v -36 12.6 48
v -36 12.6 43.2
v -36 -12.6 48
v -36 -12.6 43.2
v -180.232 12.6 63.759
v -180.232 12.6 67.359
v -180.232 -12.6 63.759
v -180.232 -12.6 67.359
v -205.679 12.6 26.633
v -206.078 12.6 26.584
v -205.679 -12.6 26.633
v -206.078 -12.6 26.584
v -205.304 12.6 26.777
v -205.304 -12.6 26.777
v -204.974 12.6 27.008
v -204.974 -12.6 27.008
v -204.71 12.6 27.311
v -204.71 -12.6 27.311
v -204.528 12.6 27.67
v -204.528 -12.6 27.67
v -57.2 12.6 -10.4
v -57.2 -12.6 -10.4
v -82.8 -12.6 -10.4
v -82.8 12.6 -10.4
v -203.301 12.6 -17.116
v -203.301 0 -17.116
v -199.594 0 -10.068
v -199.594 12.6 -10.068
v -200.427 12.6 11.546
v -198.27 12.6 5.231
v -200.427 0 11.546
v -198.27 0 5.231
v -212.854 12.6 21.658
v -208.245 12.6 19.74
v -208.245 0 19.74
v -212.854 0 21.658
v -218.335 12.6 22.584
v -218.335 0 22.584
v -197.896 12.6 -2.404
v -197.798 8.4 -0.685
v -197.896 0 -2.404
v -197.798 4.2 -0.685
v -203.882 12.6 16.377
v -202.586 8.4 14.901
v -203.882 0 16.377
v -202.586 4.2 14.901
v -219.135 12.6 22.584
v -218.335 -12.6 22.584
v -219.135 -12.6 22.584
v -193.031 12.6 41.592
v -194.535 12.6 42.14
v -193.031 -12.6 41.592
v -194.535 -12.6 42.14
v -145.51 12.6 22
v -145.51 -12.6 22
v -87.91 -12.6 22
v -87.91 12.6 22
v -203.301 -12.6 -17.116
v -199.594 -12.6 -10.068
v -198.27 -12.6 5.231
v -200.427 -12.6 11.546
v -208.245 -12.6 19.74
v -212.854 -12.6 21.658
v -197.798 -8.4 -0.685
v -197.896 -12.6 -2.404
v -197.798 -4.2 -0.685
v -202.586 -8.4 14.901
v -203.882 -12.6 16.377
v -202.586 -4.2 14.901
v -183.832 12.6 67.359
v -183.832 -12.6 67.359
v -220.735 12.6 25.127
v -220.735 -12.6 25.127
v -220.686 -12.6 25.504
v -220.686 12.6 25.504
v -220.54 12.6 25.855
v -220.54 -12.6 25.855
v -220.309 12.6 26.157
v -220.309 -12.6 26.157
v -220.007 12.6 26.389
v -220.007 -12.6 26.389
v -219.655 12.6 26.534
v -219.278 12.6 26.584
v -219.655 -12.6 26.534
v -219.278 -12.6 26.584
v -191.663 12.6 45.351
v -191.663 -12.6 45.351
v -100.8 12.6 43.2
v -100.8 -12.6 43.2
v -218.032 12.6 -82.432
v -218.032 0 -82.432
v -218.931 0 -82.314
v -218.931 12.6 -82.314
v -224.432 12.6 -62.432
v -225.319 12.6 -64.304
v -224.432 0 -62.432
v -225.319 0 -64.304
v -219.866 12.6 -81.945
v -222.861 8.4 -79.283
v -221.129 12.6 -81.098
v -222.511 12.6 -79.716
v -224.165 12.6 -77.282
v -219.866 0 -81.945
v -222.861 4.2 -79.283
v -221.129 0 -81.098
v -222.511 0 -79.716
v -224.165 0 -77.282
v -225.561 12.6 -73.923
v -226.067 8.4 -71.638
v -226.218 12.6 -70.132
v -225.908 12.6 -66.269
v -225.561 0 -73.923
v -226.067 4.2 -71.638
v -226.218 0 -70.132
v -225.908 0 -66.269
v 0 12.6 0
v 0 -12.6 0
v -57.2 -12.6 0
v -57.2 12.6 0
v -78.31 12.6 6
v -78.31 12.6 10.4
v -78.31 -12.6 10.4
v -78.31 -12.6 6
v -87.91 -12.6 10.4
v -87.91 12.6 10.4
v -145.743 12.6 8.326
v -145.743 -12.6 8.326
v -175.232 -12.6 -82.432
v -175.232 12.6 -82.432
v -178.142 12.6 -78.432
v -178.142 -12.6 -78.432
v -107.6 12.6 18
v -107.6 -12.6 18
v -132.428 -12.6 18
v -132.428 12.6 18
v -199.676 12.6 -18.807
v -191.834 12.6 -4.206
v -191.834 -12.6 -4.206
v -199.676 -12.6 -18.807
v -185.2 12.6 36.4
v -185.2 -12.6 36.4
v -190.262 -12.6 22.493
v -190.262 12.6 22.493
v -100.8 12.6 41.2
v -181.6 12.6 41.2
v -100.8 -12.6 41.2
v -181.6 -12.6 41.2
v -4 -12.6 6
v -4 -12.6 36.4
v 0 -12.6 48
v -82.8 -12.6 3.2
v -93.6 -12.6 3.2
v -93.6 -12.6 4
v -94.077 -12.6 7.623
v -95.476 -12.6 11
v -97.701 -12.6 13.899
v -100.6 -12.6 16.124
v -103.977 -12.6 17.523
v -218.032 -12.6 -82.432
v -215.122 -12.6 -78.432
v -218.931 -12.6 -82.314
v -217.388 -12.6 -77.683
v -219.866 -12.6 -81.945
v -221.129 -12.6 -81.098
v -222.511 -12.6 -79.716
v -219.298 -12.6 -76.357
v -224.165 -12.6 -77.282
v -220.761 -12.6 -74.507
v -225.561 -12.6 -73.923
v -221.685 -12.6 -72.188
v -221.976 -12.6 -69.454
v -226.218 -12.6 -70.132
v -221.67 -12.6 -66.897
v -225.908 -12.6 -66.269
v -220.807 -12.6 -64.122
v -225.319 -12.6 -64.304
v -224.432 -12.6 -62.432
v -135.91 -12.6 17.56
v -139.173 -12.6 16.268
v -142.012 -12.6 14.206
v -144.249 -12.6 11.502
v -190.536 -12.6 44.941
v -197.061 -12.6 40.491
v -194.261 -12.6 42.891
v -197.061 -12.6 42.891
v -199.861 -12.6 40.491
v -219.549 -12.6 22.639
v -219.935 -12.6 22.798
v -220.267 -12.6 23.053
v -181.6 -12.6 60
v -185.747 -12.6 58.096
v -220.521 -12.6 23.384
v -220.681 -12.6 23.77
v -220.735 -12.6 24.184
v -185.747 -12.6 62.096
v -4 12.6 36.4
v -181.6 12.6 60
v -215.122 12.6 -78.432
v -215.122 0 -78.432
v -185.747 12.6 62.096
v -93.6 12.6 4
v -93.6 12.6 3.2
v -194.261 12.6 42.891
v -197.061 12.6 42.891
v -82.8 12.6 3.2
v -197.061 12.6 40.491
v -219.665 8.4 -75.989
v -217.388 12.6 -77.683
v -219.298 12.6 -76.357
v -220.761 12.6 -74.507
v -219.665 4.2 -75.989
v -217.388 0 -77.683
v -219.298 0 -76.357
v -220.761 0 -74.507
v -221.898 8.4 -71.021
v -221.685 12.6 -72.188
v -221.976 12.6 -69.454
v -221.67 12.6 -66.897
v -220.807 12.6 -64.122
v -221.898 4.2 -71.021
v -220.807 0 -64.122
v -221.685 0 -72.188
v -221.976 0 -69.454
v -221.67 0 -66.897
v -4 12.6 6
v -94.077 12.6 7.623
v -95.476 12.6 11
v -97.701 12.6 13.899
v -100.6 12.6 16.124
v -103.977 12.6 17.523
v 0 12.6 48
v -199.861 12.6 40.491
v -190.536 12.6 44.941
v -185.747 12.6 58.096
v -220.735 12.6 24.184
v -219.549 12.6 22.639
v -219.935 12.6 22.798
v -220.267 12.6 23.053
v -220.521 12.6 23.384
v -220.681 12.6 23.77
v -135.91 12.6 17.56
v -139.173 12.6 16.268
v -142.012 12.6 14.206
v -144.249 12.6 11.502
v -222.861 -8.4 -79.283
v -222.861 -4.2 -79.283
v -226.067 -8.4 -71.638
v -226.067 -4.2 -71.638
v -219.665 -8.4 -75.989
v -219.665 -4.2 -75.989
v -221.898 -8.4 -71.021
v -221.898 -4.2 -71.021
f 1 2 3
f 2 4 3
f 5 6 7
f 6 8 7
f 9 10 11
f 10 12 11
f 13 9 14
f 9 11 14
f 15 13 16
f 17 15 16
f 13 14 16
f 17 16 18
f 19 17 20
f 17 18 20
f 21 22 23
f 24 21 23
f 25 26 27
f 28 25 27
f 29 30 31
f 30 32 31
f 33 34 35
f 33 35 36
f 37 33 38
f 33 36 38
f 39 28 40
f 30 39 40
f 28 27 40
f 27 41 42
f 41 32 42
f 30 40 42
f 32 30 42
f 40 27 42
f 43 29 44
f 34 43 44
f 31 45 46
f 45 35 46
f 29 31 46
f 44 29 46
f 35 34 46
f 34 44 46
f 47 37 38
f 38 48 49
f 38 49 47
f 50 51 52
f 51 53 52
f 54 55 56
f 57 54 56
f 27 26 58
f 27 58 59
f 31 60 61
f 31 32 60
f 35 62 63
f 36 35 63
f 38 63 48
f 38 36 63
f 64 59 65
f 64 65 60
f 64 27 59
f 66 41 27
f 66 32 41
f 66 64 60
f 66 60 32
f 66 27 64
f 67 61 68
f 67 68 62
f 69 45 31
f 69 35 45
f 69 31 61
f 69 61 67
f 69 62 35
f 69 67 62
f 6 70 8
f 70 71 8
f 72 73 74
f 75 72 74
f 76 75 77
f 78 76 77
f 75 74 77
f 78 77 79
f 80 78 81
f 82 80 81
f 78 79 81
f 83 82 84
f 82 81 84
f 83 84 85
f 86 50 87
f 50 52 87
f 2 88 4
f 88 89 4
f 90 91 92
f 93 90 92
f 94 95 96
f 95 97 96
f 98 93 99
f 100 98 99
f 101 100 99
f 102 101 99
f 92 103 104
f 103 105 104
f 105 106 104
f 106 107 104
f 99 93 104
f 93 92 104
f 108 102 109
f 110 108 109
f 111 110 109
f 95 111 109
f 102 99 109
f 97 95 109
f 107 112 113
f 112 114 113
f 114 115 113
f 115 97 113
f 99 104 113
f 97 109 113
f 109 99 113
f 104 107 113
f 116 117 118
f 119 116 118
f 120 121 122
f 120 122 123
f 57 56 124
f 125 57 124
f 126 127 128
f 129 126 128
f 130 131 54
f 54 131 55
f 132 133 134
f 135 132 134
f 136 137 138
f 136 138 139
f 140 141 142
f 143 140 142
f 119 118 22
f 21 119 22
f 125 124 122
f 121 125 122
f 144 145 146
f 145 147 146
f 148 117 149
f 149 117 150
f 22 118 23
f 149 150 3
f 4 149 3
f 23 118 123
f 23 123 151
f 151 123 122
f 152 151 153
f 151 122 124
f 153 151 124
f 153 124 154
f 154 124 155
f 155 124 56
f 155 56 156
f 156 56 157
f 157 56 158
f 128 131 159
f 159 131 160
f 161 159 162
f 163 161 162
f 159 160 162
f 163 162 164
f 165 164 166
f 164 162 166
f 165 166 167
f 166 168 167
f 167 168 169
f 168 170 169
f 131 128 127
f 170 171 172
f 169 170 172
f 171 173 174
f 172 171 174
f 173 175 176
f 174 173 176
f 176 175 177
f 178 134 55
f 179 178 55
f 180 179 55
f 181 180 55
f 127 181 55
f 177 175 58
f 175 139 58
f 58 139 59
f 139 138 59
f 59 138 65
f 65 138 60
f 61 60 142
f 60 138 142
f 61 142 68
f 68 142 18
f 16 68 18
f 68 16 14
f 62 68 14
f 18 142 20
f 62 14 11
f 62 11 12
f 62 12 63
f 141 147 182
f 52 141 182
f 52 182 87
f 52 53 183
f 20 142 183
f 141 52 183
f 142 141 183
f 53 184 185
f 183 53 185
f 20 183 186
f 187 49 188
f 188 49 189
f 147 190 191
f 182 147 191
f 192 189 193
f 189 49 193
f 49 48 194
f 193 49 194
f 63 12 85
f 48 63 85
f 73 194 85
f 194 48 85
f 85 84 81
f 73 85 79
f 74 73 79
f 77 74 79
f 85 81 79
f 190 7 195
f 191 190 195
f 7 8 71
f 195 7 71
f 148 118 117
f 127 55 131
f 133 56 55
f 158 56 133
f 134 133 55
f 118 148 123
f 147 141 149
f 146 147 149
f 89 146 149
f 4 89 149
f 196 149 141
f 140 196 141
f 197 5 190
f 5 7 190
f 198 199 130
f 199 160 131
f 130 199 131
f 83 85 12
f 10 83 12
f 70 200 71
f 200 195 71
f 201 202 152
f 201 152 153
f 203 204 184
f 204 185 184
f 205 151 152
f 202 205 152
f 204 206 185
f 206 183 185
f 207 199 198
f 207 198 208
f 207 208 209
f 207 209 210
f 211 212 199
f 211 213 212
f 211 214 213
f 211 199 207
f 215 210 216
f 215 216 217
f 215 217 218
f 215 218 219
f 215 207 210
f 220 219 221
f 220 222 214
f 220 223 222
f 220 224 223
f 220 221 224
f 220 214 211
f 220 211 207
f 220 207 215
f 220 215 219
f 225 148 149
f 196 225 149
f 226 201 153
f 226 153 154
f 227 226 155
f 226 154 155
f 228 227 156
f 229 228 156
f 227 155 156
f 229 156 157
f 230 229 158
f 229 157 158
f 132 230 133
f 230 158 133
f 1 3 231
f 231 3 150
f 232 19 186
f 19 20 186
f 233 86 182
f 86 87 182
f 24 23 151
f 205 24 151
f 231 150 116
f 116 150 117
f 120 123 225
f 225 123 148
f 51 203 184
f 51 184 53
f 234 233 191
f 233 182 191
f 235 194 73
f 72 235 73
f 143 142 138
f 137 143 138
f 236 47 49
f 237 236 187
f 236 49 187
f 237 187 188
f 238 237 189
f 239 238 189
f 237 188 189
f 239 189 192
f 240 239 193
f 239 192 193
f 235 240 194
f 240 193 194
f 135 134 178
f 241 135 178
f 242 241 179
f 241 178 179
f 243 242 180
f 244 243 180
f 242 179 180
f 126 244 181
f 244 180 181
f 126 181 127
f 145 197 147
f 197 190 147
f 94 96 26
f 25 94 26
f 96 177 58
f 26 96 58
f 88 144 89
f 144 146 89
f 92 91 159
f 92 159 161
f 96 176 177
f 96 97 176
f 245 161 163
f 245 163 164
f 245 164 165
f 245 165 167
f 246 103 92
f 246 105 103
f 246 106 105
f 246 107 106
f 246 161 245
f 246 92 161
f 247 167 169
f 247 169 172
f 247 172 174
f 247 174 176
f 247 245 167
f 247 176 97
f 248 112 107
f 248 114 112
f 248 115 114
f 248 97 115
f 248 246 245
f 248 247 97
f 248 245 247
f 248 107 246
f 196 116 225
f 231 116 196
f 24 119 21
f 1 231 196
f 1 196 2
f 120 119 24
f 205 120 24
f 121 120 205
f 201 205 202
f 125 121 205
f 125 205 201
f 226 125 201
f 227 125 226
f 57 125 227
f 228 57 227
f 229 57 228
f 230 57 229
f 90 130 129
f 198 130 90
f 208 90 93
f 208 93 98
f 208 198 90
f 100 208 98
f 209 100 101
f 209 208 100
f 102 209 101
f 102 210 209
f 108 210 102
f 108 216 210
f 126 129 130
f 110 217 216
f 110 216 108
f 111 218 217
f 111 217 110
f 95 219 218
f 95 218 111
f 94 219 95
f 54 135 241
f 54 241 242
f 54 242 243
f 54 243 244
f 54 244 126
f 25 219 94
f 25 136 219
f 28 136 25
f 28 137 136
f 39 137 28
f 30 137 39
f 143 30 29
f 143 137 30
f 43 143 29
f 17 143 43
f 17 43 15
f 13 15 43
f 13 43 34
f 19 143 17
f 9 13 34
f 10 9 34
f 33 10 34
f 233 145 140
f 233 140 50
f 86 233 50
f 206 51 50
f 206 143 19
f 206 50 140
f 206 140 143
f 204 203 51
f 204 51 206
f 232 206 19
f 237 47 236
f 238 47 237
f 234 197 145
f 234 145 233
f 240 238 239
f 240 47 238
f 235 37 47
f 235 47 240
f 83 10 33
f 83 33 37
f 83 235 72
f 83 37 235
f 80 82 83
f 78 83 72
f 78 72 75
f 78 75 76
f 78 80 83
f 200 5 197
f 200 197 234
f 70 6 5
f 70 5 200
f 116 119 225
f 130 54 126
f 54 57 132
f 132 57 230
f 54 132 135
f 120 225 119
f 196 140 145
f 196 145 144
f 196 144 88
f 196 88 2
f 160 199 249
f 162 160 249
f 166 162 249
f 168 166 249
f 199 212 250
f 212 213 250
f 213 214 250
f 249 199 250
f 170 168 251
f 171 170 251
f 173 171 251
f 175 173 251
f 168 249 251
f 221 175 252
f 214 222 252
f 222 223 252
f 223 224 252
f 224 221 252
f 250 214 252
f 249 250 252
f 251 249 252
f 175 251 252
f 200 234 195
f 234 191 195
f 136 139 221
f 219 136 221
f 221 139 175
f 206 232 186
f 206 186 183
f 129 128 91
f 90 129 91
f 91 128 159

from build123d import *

# Parameters (mm, degrees)
EXTRUDE_DEPTH = 12.6


with BuildPart() as part:
    # Sketch → Extrude (new body, symmetric)
    with BuildSketch(Plane.XZ):
        with BuildLine():
            Line((-219.278359, 26.583984), (-206.078359, 26.583984))
            ThreePointArc((-206.078359, 26.583984), (-205.131957, 26.882383), (-204.527866, 27.669651))
            Line((-204.527866, 27.669651), (-199.861118, 40.491435))
            Line((-199.861118, 40.491435), (-197.061118, 40.491435))
            Line((-197.061118, 40.491435), (-197.061118, 42.891435))
            Line((-197.061118, 42.891435), (-194.261118, 42.891435))
            Line((-194.261118, 42.891435), (-194.534734, 42.139681))
            Line((-194.534734, 42.139681), (-193.031226, 41.592449))
            Line((-193.031226, 41.592449), (-191.663145, 45.351219))
            Line((-191.663145, 45.351219), (-190.535514, 44.940795))
            Line((-190.535514, 44.940795), (-185.747232, 58.096492))
            Line((-185.747232, 58.096492), (-185.747232, 62.096492))
            Line((-185.747232, 62.096492), (-183.831919, 67.35877))
            Line((-183.831919, 67.35877), (-180.231919, 67.35877))
            Line((-180.231919, 67.35877), (-180.231919, 63.75877))
            Line((-180.231919, 63.75877), (-181.6, 60))
            Line((-181.6, 60), (-181.6, 41.2))
            Line((-181.6, 41.2), (-100.8, 41.2))
            Line((-100.8, 41.2), (-100.8, 43.2))
            Line((-100.8, 43.2), (-36, 43.2))
            Line((-36, 43.2), (-36, 48))
            Line((-36, 48), (0, 48))
            Line((0, 48), (0, 0))
            Line((0, 0), (-57.2, 0))
            Line((-57.2, 0), (-57.2, -10.4))
            Line((-57.2, -10.4), (-82.8, -10.4))
            Line((-82.8, -10.4), (-82.8, 3.2))
            Line((-82.8, 3.2), (-93.6, 3.2))
            Line((-93.6, 3.2), (-93.6, 4))
            ThreePointArc((-93.6, 4), (-97.700505, 13.899495), (-107.6, 18))
            Line((-107.6, 18), (-132.428405, 18))
            ThreePointArc((-132.428405, 18), (-140.657398, 15.326238), (-145.743196, 8.326238))
            Line((-145.743196, 8.326238), (-175.232195, -82.431568))
            Line((-175.232195, -82.431568), (-218.032195, -82.431568))
            add(Edge.make_bspline(
                [(-218.032195, -82.431568), (-222.60054, -82.508301), (-229.560425, -71.441643), (-224.432195, -62.431568)],
                knots=[0, 0, 0, 0, 16.552678, 16.552678, 16.552678, 16.552678], degree=3))
            Line((-224.432195, -62.431568), (-203.301282, -17.116179))
            add(Edge.make_bspline(
                [(-203.301282, -17.116179), (-192.874893, -2.614162), (-196.88326, 21.204461), (-218.335348, 22.583984)],
                knots=[0, 0, 0, 0, 54.516173, 54.516173, 54.516173, 54.516173], degree=3))
            Line((-218.335348, 22.583984), (-219.135348, 22.583984))
            ThreePointArc((-219.135348, 22.583984), (-220.266718, 23.052613), (-220.735348, 24.183984))
            Line((-220.735348, 24.183984), (-220.735348, 25.126995))
            ThreePointArc((-220.735348, 25.126995), (-220.308605, 26.157242), (-219.278359, 26.583984))
        make_face()
        with BuildLine():
            Line((-215.122195, -78.431568), (-178.142195, -78.431568))
            Line((-178.142195, -78.431568), (-145.51, 22))
            Line((-145.51, 22), (-87.91, 22))
            Line((-87.91, 22), (-87.91, 10.4))
            Line((-87.91, 10.4), (-78.31, 10.4))
            Line((-78.31, 10.4), (-78.31, 6))
            Line((-78.31, 6), (-4, 6))
            Line((-4, 6), (-4, 36.4))
            Line((-4, 36.4), (-185.2, 36.4))
            Line((-185.2, 36.4), (-190.261898, 22.492549))
            Line((-190.261898, 22.492549), (-191.833618, -4.206153))
            Line((-191.833618, -4.206153), (-199.67605, -18.806652))
            Line((-199.67605, -18.806652), (-220.806963, -64.122041))
            add(Edge.make_bspline(
                [(-215.122195, -78.431568), (-220.482315, -77.450493), (-223.897415, -71.787476), (-220.806963, -64.122041)],
                knots=[0, 0, 0, 0, 15.793542, 15.793542, 15.793542, 15.793542], degree=3))
        make_face(mode=Mode.SUBTRACT)
    extrude(amount=EXTRUDE_DEPTH, both=True)


solid = part.part
